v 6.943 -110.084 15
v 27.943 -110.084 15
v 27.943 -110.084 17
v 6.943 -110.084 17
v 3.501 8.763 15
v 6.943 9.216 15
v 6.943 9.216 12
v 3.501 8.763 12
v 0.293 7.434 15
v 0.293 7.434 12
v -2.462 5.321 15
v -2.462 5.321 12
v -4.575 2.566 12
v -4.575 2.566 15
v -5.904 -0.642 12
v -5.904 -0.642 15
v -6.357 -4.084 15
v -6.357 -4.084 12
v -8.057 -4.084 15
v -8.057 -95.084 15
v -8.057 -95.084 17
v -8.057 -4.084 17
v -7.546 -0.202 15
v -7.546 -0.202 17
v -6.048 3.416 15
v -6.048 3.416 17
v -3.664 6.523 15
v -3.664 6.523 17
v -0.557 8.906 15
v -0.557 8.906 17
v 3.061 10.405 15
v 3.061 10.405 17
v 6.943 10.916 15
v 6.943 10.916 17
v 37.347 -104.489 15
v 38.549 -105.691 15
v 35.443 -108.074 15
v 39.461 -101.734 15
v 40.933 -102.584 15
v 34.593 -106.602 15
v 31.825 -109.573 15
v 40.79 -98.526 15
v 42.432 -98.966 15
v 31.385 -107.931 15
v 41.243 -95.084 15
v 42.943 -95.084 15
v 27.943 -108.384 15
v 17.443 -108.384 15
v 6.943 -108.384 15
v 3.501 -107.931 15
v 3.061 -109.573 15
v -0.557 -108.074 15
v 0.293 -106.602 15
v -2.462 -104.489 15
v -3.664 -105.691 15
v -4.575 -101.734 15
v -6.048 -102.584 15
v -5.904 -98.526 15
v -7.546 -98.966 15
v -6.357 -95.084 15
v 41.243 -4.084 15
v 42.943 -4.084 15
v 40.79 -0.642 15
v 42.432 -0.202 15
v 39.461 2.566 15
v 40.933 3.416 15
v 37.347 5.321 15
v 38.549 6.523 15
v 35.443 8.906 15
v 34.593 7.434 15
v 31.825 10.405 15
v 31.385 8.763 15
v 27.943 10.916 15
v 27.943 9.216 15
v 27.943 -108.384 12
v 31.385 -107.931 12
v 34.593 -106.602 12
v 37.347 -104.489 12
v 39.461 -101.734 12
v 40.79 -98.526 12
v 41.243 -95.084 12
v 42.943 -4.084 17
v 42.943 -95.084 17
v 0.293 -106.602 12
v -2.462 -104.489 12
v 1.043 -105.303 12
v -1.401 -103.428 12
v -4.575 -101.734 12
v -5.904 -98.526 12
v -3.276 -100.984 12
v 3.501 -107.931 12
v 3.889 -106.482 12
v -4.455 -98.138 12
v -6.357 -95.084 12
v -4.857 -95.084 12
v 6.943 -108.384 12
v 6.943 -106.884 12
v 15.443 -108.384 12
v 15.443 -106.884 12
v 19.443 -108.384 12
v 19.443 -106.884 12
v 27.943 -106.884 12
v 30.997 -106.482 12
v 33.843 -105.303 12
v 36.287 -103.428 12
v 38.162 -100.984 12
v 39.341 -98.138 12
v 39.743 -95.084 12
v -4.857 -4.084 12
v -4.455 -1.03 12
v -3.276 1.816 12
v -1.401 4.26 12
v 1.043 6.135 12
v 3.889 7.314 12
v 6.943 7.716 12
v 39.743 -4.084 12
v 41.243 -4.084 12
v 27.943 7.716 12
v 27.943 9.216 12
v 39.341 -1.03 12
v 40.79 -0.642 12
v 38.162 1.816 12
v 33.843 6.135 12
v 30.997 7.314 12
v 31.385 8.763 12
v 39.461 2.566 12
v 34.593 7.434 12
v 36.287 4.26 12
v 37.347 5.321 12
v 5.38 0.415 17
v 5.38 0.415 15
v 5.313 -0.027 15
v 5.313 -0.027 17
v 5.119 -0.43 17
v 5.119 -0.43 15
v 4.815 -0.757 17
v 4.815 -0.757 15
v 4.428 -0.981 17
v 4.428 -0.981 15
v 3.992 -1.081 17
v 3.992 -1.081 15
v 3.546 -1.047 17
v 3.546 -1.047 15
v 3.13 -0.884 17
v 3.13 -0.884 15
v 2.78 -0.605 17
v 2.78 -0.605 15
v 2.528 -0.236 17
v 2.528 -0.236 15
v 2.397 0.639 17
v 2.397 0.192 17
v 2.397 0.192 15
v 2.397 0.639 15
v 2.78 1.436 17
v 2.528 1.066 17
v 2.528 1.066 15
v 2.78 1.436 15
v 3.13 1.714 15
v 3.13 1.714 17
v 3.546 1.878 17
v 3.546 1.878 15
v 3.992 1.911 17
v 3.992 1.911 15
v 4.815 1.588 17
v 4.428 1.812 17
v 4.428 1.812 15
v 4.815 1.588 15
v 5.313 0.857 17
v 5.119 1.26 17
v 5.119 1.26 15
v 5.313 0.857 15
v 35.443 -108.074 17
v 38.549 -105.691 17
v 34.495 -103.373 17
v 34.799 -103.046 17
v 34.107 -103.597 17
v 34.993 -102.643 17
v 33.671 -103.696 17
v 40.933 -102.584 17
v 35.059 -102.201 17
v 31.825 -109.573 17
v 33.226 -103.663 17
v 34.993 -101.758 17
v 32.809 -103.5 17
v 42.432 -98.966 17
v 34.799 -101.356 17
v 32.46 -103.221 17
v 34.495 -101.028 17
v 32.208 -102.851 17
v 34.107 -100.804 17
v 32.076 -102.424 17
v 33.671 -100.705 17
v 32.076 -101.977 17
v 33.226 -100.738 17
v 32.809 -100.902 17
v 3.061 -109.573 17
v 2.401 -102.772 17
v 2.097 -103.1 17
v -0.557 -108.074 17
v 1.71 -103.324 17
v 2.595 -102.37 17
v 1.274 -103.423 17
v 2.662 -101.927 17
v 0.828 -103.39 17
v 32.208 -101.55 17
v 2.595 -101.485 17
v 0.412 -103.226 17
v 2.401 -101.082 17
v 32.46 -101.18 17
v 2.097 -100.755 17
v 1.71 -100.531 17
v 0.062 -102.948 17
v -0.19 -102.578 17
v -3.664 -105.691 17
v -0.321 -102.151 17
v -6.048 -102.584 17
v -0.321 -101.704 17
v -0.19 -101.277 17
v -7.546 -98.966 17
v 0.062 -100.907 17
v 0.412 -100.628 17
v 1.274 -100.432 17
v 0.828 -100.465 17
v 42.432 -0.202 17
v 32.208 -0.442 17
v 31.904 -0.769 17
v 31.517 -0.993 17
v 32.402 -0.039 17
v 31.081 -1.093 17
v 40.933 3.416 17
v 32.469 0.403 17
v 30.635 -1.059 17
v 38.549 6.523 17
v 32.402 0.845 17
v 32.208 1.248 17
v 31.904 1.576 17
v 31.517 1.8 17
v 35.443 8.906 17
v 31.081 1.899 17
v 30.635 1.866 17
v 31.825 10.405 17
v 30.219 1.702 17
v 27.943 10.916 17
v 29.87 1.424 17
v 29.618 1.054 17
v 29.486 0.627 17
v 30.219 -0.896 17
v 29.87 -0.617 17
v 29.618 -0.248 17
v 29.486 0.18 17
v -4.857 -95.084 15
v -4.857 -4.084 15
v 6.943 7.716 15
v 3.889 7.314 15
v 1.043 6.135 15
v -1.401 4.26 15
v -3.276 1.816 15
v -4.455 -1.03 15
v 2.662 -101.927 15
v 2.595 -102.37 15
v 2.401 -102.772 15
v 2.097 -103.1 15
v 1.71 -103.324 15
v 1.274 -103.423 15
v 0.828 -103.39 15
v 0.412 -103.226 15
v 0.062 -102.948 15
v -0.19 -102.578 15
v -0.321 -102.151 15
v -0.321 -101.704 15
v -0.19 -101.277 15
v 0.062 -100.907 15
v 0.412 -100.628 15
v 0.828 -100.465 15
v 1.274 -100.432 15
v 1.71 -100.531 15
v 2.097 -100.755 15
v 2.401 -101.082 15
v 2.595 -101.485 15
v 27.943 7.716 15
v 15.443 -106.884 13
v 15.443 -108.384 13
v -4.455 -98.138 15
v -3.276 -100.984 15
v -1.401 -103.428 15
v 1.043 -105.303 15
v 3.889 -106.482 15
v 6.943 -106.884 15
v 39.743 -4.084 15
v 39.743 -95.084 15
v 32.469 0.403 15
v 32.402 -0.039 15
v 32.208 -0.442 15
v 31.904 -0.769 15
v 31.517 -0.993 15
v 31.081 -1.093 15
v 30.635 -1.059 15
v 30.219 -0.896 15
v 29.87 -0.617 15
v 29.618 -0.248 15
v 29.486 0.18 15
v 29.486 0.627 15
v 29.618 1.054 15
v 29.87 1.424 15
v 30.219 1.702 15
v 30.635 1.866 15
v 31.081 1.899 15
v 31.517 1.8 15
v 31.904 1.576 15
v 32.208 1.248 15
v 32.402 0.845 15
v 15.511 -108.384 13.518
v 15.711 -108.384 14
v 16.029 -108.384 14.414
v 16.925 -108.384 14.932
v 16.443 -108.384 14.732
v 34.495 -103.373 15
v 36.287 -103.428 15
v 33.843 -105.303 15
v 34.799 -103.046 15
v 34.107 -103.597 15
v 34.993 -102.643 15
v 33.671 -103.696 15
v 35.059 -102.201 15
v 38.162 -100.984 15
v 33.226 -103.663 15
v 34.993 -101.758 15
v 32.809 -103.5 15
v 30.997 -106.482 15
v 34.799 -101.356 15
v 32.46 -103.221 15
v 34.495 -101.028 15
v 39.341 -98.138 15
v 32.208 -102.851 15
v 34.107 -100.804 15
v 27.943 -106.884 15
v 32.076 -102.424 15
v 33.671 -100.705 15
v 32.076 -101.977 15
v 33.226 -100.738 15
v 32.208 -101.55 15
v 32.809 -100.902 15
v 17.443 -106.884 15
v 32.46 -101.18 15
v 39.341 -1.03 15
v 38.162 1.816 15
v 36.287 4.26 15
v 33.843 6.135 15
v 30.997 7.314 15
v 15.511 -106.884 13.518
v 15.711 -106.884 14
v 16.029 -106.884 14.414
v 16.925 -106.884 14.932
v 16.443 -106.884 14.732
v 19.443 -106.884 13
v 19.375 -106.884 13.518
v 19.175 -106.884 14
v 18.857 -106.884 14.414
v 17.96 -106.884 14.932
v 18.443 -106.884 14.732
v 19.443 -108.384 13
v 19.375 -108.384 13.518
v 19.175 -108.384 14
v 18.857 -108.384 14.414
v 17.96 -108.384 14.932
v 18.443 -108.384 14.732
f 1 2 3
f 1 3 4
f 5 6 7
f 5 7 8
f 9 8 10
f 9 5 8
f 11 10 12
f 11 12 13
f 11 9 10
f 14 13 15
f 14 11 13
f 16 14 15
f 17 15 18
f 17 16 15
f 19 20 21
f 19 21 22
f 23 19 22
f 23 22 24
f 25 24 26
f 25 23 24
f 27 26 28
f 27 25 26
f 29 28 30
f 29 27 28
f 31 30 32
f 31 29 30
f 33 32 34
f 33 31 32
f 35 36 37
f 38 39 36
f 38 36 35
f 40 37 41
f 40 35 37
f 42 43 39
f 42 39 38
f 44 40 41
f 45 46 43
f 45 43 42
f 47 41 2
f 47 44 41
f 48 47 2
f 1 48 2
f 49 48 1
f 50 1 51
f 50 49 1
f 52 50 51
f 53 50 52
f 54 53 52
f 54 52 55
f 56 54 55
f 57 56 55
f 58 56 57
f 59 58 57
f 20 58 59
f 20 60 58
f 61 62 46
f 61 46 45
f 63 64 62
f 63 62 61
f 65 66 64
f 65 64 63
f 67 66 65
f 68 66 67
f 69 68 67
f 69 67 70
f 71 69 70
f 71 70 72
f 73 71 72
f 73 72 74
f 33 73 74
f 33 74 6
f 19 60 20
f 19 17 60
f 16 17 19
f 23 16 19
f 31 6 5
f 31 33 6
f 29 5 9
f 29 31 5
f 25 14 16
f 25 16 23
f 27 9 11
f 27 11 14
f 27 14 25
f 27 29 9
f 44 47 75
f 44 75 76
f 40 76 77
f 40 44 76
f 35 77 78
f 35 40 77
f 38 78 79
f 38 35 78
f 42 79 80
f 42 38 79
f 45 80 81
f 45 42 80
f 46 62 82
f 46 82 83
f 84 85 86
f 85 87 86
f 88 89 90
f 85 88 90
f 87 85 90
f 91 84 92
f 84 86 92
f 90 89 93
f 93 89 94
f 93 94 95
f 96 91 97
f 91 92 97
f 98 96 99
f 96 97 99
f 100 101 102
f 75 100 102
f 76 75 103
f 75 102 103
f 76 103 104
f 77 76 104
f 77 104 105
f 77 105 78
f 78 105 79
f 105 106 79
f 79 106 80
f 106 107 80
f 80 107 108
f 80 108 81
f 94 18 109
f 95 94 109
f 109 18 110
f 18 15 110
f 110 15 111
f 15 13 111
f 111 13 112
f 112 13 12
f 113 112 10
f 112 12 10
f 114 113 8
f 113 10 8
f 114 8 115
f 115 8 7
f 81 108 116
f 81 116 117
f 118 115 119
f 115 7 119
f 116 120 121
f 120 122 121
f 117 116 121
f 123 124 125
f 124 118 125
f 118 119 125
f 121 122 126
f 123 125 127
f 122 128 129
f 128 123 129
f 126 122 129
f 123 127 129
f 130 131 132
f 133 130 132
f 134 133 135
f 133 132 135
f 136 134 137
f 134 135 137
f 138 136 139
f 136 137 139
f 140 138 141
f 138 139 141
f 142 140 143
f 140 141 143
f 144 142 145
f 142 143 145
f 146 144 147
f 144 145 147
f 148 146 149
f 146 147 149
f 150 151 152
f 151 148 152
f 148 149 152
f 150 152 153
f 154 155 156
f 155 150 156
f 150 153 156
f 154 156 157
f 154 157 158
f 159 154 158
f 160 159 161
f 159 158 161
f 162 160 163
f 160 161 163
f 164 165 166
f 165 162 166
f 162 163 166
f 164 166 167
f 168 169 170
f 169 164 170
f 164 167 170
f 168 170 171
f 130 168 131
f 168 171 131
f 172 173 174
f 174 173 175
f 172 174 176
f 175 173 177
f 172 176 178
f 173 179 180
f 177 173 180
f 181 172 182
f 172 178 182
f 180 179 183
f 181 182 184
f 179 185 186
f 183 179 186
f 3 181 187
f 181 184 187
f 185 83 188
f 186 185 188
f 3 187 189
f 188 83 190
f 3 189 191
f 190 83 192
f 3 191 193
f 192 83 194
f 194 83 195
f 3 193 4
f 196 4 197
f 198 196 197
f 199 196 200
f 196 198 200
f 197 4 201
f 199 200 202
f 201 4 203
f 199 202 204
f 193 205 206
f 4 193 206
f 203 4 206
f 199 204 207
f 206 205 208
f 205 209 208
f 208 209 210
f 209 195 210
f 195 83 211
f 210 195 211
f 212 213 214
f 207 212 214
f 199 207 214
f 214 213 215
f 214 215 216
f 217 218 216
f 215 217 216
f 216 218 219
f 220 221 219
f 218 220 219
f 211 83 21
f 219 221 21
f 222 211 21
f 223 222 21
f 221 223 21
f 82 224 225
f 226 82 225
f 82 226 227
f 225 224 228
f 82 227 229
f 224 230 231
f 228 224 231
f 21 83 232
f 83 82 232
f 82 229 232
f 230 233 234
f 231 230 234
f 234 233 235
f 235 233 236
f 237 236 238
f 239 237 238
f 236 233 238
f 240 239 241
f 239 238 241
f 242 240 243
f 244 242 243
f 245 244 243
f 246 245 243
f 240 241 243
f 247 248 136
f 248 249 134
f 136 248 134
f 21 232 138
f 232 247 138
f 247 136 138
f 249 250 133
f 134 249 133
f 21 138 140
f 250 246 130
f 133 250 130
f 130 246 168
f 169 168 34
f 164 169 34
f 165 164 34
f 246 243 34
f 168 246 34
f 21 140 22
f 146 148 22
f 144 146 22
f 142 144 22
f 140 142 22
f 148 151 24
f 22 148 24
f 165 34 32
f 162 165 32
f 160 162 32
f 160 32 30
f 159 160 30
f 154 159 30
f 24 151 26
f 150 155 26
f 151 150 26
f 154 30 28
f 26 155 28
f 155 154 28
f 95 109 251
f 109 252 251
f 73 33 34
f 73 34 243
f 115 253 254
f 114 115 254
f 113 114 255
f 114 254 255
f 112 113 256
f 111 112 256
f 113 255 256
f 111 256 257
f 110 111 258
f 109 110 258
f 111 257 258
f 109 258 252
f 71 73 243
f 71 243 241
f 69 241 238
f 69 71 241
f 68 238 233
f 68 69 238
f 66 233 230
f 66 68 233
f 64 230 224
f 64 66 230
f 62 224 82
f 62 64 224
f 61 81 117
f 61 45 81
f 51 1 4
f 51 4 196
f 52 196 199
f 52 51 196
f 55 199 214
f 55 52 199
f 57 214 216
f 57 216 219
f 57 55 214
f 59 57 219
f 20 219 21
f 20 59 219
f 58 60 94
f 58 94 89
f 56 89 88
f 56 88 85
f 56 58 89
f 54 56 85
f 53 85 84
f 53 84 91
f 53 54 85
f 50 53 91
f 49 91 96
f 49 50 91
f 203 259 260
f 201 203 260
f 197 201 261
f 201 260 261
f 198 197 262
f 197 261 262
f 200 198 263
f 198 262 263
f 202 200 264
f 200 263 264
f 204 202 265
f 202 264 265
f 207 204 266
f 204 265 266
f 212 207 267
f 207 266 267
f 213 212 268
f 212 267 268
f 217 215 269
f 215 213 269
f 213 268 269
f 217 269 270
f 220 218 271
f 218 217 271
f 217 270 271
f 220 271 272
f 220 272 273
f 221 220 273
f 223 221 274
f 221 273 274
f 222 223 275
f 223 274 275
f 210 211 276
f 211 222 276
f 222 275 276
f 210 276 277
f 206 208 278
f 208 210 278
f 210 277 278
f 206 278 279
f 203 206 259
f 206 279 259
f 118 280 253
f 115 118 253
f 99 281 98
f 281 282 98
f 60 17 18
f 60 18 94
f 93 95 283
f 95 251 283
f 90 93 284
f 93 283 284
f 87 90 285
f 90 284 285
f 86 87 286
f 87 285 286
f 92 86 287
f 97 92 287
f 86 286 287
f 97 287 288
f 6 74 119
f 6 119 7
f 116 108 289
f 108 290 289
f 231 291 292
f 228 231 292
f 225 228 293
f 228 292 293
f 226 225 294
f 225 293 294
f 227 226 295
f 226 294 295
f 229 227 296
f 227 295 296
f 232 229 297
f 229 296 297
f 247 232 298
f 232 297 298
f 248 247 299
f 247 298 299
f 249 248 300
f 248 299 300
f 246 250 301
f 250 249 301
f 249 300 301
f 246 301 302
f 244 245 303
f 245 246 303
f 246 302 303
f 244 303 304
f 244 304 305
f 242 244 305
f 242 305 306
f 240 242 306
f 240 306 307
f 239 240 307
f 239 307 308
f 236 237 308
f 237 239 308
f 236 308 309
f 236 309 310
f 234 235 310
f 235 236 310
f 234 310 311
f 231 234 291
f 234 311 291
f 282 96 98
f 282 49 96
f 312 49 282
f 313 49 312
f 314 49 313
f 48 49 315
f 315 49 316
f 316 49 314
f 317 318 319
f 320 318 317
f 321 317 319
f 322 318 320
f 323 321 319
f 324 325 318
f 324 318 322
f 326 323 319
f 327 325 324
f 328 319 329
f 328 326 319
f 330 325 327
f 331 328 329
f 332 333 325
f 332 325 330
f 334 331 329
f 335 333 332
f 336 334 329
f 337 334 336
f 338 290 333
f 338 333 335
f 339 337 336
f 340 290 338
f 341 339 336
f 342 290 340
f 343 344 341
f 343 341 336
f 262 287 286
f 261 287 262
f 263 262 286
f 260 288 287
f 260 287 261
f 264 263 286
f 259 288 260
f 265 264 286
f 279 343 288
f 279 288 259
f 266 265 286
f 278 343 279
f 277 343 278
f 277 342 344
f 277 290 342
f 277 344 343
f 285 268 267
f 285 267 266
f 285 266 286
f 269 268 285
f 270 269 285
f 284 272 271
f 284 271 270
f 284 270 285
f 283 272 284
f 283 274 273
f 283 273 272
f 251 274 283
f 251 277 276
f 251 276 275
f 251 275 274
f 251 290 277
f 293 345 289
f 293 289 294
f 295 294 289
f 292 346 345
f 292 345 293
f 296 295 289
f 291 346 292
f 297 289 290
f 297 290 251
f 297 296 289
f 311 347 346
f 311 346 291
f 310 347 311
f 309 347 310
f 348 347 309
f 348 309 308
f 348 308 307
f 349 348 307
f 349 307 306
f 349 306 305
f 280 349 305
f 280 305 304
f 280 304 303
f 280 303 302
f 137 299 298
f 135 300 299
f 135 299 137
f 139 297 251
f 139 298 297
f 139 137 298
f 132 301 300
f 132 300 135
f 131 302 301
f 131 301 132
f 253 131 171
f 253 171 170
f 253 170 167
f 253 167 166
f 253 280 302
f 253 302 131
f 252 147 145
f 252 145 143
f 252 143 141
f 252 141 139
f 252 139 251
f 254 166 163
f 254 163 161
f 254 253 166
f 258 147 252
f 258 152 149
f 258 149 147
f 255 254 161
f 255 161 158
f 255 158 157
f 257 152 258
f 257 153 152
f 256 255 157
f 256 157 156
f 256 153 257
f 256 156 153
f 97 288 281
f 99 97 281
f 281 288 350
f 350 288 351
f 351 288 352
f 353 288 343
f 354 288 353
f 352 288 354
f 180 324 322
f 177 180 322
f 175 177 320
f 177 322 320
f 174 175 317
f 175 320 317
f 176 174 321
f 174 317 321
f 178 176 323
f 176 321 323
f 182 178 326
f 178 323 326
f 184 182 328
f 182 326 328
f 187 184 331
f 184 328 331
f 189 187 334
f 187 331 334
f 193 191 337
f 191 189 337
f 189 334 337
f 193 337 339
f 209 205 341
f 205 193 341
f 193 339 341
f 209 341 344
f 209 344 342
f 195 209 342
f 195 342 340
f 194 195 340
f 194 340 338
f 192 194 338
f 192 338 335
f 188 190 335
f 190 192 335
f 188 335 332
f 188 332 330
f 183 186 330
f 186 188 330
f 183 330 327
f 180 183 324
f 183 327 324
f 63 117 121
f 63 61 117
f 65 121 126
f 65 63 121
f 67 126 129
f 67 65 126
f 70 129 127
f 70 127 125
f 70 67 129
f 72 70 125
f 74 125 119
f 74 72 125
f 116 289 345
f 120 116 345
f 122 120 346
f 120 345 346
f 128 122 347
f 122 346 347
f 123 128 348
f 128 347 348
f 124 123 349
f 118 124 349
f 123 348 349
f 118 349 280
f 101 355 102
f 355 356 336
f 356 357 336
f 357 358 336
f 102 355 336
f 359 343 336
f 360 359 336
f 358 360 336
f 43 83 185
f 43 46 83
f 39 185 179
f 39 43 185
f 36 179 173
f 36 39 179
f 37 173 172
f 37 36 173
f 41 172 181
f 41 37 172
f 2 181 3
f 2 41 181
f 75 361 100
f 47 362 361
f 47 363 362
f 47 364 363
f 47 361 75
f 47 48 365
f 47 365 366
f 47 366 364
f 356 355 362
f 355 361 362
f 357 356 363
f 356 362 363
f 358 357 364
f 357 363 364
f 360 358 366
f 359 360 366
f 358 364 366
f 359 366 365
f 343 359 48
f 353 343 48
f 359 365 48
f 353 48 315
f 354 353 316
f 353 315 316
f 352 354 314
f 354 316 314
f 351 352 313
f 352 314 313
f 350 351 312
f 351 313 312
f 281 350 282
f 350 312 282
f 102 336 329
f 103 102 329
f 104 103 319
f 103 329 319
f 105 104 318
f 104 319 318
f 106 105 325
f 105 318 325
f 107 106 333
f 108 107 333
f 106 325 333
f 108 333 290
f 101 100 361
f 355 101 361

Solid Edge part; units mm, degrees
sketch "Sketch1" plane through (0, 0, 15) normal (0, 0, 1) x (1, 0, 0)
  circle A0 centre (3.8798, 0.4153) radius 1.5
  circle A1 centre (33.5593, -102.2006) radius 1.5
  arc A2 (27.9428, 10.916) -> (42.9428, -4.084) centre (27.9428, -4.084) cw
  line L0 (42.9428, -4.084) -> (42.9428, -95.084)
  arc A3 (42.9428, -95.084) -> (27.9428, -110.084) centre (27.9428, -95.084) cw
  line L1 (27.9428, -110.084) -> (6.9428, -110.084)
  arc A4 (6.9428, -110.084) -> (-8.0572, -95.084) centre (6.9428, -95.084) cw
  line L2 (-8.0572, -95.084) -> (-8.0572, -4.084)
  arc A5 (-8.0572, -4.084) -> (6.9428, 10.916) centre (6.9428, -4.084) cw
  line L3 (6.9428, 10.916) -> (27.9428, 10.916)
  circle A6 centre (30.9691, 0.4033) radius 1.5
  circle A7 centre (1.1618, -101.9274) radius 1.5
extrude "Protrusion1" add sketch "Sketch1" along normal blind 2
sketch "Sketch2" plane through (17.4428, -49.584, 15) normal (0, 0, -1) x (0, -1, 0)
  arc A0 (-58.8, 10.5) -> (-45.5, 23.8) centre (-45.5, 10.5) cw
  line L0 (-45.5, 23.8) -> (45.5, 23.8)
  arc A1 (45.5, 23.8) -> (58.8, 10.5) centre (45.5, 10.5) cw
  line L1 (58.8, 10.5) -> (58.8, -10.5)
  arc A2 (58.8, -10.5) -> (45.5, -23.8) centre (45.5, -10.5) cw
  line L2 (45.5, -23.8) -> (-45.5, -23.8)
  arc A3 (-45.5, -23.8) -> (-58.8, -10.5) centre (-45.5, -10.5) cw
  line L3 (-58.8, -10.5) -> (-58.8, 10.5)
  arc A4 (-45.5, -22.3) -> (-57.3, -10.5) centre (-45.5, -10.5) cw
  line L4 (-57.3, -10.5) -> (-57.3, 10.5)
  arc A5 (-57.3, 10.5) -> (-45.5, 22.3) centre (-45.5, 10.5) cw
  line L5 (-45.5, 22.3) -> (45.5, 22.3)
  arc A6 (45.5, 22.3) -> (57.3, 10.5) centre (45.5, 10.5) cw
  line L6 (57.3, 10.5) -> (57.3, -10.5)
  arc A7 (57.3, -10.5) -> (45.5, -22.3) centre (45.5, -10.5) cw
  line L7 (45.5, -22.3) -> (-45.5, -22.3)
  dimension "D1" = 1.5
extrude "ExtrudedProtrusion_2" add sketch "Sketch2" along normal blind 3
sketch "Sketch3" plane through (17.4428, -108.384, 13.5) normal (0, -1, 0) x (-1, 0, 0)
  line L0 (-2, 1.5) -> (-2, 0.5)
  arc A0 (-2, 0.5) -> (2, 0.5) centre (0, 0.5) ccw
  line L1 (2, 0.5) -> (2, 1.5)
  line L2 (2, 1.5) -> (-2, 1.5)
extrude "ExtrudedCutout_1" cut sketch "Sketch3" against normal blind 2
